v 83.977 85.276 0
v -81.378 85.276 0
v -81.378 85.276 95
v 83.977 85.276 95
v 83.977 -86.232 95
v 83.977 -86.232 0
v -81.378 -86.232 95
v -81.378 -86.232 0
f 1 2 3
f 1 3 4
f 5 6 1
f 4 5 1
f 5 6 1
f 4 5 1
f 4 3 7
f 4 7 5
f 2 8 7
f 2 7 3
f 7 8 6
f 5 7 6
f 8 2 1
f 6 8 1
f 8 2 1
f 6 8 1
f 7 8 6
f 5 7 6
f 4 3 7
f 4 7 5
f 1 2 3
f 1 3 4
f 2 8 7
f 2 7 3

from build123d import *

# Parameters (mm, degrees)
F1_W     = 165.3544977307
F1_H     = 171.5079024434
F1_R     = 60.0545134234
F2_DEPTH = 95
F0_W     = 165.3544977307
F0_H     = 171.5079024434


with BuildPart() as f2:
    # F1 (on face) → F2 (new body)
    with BuildSketch(Plane.XY):
        with Locations((1.299675554, -0.478040427)):
            Rectangle(F1_W, F1_H)
        Circle(F1_R, mode=Mode.SUBTRACT)
        Circle(F1_R)
    extrude(amount=F2_DEPTH)


with BuildPart() as f2b:
    # F0 (on Top) → F2, piece 2 (new body)
    with BuildSketch(Plane.XY):
        with Locations((1.299675554, -0.478040427)):
            Rectangle(F0_W, F0_H)
    extrude(amount=F2_DEPTH)


solid = Compound([f2.part, f2b.part])
